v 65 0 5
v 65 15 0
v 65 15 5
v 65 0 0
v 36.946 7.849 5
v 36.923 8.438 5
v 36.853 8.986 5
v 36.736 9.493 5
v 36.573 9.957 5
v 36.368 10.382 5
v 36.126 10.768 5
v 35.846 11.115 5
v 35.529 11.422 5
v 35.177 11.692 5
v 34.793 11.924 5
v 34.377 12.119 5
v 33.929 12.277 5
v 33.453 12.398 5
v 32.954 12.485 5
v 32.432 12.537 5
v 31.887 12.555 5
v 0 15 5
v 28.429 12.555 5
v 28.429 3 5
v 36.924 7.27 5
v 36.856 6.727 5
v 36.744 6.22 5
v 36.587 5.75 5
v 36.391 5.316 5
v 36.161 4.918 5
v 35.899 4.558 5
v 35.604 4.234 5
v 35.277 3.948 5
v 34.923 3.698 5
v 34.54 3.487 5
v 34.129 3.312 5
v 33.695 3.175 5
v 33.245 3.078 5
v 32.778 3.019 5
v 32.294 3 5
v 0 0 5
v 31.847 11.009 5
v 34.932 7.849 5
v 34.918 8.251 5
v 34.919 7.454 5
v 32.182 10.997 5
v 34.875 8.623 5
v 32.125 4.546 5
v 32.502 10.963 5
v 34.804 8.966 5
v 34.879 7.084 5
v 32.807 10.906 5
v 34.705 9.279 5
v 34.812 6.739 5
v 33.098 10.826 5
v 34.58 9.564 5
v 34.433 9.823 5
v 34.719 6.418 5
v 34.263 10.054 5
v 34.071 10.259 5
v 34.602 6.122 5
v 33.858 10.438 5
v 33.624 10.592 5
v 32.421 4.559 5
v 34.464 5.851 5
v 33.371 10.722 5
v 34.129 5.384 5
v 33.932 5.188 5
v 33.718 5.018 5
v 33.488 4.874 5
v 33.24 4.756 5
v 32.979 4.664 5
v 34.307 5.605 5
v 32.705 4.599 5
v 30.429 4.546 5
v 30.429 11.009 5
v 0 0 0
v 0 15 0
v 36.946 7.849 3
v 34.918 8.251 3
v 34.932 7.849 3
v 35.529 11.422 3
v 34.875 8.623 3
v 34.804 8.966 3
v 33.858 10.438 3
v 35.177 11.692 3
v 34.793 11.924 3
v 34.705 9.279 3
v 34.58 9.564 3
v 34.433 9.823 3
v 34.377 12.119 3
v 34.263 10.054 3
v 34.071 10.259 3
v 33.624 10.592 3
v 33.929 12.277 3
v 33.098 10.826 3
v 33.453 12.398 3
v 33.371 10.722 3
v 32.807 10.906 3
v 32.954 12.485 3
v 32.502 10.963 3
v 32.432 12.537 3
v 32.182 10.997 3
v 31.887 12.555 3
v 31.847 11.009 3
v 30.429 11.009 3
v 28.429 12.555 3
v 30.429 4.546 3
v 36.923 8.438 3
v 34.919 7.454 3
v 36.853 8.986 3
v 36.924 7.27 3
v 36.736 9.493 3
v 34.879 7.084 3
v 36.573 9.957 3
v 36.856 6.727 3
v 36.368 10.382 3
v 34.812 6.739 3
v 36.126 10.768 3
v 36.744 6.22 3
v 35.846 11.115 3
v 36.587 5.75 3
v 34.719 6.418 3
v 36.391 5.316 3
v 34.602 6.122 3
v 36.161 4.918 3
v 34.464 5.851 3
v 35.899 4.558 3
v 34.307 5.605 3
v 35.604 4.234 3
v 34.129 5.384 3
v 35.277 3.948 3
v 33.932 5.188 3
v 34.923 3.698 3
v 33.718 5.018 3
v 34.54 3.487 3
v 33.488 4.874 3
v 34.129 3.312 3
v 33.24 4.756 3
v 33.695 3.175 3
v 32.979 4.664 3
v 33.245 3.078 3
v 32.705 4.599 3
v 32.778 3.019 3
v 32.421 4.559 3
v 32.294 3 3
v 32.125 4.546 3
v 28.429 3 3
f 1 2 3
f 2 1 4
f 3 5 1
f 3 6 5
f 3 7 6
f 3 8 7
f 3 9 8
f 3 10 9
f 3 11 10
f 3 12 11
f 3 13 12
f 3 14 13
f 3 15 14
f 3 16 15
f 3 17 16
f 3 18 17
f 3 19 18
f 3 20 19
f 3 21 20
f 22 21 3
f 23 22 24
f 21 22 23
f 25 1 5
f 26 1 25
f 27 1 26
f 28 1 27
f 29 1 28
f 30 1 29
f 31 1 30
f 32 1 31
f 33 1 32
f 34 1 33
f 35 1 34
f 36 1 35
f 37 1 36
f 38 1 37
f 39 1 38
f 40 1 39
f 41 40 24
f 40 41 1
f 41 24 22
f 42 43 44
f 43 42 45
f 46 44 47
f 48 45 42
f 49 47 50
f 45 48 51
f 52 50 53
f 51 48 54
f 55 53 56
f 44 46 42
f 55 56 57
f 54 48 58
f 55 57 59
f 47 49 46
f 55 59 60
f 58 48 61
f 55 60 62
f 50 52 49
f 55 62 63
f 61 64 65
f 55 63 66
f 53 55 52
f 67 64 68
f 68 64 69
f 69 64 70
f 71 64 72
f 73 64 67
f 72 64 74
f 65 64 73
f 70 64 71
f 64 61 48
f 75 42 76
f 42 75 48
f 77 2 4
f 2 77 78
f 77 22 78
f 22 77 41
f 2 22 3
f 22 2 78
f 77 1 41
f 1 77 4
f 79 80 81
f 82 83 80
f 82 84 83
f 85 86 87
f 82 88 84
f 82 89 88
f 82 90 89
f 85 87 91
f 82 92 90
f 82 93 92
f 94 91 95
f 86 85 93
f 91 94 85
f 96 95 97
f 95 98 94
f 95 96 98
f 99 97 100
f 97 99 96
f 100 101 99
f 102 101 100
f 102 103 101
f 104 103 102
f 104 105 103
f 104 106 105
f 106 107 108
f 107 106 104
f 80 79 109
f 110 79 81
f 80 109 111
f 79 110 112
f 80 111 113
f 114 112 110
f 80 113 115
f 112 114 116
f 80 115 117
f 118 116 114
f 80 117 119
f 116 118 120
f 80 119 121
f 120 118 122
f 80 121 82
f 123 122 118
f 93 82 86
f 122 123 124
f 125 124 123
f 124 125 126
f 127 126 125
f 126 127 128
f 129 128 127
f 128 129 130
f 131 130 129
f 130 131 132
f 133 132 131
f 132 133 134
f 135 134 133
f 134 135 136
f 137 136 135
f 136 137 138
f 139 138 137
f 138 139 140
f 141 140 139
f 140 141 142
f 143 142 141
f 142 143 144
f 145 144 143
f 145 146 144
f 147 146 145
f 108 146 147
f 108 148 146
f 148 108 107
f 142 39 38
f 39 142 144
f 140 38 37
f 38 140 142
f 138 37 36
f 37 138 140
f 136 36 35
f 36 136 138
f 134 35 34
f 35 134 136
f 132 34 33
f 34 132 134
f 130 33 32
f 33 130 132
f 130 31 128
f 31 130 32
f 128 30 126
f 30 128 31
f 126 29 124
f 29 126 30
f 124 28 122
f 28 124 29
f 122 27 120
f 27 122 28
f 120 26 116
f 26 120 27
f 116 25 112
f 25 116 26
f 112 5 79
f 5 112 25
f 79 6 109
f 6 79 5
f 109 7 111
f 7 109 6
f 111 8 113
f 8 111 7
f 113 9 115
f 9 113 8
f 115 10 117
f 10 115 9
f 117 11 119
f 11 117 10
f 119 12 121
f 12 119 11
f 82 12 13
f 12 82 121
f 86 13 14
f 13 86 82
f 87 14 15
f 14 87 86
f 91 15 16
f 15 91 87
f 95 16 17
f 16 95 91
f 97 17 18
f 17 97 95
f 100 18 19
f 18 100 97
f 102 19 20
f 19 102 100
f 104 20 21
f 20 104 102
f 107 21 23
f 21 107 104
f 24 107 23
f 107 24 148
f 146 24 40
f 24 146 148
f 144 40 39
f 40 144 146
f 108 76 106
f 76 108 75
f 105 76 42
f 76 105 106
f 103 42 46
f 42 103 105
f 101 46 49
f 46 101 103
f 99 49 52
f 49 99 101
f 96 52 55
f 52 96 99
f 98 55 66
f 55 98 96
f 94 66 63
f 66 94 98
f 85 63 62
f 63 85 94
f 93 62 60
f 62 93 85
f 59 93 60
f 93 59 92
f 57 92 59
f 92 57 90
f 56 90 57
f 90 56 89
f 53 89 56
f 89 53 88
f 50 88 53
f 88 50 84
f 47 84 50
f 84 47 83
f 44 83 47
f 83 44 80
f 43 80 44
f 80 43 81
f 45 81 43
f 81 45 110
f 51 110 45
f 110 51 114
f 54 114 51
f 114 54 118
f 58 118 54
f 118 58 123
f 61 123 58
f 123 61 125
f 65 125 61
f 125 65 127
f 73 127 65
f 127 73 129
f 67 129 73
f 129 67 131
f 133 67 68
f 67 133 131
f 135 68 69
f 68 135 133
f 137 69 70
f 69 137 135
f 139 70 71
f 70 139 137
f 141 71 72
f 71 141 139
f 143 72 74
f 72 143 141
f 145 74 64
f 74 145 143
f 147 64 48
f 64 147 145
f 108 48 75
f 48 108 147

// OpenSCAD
difference(){
	union(){ 
        translate([0,0,0]){
           cube([65,15,5], center=false);
        }                
	}
	union() {
        translate([60-65/2, 3,3]){
            linear_extrude(height = 10) {
                text("D", size = 10, font="Arial:style=Bold");
            }
        }                


	}
}
